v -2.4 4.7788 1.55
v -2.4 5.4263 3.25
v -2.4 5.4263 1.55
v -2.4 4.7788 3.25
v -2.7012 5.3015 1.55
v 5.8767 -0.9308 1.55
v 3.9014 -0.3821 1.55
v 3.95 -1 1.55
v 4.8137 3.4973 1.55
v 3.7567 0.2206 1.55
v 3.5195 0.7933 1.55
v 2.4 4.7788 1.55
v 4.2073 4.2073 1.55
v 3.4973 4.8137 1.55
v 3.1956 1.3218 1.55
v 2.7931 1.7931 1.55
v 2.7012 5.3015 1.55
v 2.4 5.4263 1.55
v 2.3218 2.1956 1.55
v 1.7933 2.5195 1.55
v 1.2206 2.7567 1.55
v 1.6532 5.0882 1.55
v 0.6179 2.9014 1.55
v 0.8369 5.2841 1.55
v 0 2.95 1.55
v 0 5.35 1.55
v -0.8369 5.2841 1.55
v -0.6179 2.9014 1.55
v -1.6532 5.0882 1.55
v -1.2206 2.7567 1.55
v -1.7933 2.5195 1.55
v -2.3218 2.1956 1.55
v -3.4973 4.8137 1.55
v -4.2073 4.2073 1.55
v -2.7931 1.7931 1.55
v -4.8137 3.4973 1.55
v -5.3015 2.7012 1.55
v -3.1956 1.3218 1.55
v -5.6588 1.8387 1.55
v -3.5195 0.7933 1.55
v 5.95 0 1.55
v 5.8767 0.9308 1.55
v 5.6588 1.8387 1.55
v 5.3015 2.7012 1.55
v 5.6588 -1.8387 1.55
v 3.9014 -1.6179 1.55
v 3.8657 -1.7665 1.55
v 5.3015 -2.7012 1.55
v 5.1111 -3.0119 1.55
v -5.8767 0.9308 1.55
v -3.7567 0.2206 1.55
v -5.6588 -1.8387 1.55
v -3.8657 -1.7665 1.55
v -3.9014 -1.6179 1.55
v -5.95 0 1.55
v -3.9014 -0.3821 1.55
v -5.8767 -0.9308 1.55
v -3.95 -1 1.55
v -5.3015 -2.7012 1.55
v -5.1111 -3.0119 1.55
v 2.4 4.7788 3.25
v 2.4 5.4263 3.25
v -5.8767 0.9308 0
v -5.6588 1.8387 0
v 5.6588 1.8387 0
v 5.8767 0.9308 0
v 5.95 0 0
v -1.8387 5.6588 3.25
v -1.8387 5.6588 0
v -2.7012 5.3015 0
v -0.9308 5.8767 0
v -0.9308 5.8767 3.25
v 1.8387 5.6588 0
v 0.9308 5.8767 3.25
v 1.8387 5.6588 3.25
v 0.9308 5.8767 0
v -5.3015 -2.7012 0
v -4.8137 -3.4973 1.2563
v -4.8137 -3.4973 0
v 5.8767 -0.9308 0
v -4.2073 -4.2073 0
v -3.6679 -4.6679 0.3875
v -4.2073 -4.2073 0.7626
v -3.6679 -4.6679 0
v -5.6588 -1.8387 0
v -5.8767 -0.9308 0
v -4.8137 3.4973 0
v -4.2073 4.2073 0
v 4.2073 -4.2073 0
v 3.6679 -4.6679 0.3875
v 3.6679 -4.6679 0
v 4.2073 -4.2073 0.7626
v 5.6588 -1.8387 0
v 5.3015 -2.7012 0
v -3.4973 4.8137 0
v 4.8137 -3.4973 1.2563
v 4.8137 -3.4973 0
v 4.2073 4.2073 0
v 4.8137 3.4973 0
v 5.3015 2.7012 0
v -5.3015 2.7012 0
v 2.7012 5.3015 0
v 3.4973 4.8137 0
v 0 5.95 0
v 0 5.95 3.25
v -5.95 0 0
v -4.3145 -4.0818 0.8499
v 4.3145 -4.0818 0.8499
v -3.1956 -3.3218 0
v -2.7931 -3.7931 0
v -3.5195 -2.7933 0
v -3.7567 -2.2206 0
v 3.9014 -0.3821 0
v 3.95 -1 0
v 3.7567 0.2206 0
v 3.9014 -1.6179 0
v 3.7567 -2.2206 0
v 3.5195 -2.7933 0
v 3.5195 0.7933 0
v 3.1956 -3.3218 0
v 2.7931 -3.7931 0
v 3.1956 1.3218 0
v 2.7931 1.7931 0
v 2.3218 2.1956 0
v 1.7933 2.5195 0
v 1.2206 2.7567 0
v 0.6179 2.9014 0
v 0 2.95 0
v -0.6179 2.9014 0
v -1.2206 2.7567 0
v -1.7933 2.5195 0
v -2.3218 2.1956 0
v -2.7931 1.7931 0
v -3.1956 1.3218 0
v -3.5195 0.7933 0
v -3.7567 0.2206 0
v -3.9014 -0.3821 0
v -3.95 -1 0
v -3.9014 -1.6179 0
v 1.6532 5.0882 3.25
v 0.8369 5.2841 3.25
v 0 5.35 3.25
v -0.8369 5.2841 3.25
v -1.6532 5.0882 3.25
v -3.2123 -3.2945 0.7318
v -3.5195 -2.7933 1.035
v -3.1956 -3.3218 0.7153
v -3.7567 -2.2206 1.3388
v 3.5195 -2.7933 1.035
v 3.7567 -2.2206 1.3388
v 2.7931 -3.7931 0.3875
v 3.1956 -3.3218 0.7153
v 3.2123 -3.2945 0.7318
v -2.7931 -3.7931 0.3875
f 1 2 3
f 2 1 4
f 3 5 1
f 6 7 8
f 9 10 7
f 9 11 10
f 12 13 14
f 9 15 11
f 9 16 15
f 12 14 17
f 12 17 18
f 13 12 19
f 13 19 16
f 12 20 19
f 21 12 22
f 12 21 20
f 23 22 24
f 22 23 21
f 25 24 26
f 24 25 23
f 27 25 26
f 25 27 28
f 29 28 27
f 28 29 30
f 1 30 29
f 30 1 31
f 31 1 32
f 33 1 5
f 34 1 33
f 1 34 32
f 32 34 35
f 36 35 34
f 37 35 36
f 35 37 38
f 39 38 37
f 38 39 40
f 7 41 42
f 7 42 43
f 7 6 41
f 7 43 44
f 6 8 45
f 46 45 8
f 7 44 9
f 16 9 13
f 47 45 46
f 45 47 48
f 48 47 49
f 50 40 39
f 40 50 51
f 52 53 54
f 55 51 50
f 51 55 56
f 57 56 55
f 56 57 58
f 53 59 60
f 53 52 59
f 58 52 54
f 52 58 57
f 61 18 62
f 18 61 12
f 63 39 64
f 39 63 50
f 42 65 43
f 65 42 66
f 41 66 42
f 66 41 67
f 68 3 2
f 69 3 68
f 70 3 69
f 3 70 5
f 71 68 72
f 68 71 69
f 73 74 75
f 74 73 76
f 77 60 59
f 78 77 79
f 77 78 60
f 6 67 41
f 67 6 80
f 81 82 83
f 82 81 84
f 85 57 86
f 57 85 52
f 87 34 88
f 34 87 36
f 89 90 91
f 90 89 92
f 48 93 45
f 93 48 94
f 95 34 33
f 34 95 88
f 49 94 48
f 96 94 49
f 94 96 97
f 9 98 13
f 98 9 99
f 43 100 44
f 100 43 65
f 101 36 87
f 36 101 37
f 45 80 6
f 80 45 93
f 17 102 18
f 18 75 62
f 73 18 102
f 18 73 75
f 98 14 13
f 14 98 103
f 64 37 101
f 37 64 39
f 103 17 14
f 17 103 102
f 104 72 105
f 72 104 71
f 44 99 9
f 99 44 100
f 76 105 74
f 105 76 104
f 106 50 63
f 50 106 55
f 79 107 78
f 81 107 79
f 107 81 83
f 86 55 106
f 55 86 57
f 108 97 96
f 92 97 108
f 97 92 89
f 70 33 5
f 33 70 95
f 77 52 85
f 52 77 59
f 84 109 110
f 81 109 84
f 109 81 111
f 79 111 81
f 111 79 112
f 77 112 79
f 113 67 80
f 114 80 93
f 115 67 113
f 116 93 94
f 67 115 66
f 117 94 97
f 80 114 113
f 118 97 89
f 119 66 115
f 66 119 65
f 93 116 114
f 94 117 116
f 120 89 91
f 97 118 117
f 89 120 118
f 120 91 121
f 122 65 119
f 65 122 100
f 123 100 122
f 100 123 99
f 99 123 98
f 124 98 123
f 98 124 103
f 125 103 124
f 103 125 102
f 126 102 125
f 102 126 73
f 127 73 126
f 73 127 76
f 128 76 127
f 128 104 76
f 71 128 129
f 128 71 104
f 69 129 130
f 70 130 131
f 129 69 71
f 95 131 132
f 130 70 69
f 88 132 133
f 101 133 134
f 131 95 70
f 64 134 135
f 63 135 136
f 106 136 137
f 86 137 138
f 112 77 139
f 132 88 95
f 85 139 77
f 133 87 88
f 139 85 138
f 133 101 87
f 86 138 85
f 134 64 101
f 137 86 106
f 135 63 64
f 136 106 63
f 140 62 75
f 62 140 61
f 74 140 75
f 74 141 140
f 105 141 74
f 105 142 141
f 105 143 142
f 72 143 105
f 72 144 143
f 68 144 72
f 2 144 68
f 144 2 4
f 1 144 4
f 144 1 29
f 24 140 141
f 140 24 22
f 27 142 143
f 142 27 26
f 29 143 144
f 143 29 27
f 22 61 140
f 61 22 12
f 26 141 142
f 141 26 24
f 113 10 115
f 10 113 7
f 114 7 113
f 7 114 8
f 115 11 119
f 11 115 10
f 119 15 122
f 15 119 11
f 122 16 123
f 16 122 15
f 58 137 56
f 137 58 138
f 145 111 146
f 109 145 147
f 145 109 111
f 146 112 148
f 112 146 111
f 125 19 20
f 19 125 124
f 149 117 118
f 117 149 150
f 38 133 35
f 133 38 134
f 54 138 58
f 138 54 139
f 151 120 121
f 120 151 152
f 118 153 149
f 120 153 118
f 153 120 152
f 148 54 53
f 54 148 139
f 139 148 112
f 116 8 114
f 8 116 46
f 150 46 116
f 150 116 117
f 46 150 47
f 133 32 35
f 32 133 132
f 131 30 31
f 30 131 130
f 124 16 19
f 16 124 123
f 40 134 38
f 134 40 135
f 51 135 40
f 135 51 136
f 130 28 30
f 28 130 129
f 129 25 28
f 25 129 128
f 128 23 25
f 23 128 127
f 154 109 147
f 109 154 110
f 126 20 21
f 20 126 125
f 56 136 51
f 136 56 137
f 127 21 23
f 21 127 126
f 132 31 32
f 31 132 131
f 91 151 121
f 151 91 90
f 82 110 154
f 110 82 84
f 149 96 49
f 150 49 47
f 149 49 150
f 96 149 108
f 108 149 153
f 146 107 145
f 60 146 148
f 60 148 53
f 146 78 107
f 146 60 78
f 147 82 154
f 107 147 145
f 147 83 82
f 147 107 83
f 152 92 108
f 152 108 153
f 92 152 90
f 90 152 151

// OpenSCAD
$fn=40;
fudge=0.1;
oDia=11.9;
iDia=7.9;
shift=(11.9-7.9)/2-3;
wallDims=[4.9,1.2,3.25]; //total dims of wall part
d=oDia*sqrt(2); 
thick=1.55;

difference(){
  cylinder(d=oDia,h=wallDims.z);
  translate([0,0,thick]) cylinder(d=oDia-wallDims.y,h=wallDims.z-thick+fudge);
  translate([0,shift,-fudge/2]) cylinder(d=iDia,h=thick+fudge);
  translate([0,shift,-fudge/2]) rotate(-90-45) cube([oDia,oDia,wallDims.z+fudge]);
  translate([0,shift-d/2,thick/4]) rotate(-45) 
    linear_extrude(height=thick*0.75+fudge,scale=1.4) square(oDia,true);
  for (ix=[-1,1])
    translate([ix*((oDia-wallDims.x)/4+wallDims.x/2),0,thick+(wallDims.z-thick+fudge)/2]) 
      cube([(oDia-wallDims.x)/2+fudge,oDia+fudge,wallDims.z-thick+fudge],true);
  
}
